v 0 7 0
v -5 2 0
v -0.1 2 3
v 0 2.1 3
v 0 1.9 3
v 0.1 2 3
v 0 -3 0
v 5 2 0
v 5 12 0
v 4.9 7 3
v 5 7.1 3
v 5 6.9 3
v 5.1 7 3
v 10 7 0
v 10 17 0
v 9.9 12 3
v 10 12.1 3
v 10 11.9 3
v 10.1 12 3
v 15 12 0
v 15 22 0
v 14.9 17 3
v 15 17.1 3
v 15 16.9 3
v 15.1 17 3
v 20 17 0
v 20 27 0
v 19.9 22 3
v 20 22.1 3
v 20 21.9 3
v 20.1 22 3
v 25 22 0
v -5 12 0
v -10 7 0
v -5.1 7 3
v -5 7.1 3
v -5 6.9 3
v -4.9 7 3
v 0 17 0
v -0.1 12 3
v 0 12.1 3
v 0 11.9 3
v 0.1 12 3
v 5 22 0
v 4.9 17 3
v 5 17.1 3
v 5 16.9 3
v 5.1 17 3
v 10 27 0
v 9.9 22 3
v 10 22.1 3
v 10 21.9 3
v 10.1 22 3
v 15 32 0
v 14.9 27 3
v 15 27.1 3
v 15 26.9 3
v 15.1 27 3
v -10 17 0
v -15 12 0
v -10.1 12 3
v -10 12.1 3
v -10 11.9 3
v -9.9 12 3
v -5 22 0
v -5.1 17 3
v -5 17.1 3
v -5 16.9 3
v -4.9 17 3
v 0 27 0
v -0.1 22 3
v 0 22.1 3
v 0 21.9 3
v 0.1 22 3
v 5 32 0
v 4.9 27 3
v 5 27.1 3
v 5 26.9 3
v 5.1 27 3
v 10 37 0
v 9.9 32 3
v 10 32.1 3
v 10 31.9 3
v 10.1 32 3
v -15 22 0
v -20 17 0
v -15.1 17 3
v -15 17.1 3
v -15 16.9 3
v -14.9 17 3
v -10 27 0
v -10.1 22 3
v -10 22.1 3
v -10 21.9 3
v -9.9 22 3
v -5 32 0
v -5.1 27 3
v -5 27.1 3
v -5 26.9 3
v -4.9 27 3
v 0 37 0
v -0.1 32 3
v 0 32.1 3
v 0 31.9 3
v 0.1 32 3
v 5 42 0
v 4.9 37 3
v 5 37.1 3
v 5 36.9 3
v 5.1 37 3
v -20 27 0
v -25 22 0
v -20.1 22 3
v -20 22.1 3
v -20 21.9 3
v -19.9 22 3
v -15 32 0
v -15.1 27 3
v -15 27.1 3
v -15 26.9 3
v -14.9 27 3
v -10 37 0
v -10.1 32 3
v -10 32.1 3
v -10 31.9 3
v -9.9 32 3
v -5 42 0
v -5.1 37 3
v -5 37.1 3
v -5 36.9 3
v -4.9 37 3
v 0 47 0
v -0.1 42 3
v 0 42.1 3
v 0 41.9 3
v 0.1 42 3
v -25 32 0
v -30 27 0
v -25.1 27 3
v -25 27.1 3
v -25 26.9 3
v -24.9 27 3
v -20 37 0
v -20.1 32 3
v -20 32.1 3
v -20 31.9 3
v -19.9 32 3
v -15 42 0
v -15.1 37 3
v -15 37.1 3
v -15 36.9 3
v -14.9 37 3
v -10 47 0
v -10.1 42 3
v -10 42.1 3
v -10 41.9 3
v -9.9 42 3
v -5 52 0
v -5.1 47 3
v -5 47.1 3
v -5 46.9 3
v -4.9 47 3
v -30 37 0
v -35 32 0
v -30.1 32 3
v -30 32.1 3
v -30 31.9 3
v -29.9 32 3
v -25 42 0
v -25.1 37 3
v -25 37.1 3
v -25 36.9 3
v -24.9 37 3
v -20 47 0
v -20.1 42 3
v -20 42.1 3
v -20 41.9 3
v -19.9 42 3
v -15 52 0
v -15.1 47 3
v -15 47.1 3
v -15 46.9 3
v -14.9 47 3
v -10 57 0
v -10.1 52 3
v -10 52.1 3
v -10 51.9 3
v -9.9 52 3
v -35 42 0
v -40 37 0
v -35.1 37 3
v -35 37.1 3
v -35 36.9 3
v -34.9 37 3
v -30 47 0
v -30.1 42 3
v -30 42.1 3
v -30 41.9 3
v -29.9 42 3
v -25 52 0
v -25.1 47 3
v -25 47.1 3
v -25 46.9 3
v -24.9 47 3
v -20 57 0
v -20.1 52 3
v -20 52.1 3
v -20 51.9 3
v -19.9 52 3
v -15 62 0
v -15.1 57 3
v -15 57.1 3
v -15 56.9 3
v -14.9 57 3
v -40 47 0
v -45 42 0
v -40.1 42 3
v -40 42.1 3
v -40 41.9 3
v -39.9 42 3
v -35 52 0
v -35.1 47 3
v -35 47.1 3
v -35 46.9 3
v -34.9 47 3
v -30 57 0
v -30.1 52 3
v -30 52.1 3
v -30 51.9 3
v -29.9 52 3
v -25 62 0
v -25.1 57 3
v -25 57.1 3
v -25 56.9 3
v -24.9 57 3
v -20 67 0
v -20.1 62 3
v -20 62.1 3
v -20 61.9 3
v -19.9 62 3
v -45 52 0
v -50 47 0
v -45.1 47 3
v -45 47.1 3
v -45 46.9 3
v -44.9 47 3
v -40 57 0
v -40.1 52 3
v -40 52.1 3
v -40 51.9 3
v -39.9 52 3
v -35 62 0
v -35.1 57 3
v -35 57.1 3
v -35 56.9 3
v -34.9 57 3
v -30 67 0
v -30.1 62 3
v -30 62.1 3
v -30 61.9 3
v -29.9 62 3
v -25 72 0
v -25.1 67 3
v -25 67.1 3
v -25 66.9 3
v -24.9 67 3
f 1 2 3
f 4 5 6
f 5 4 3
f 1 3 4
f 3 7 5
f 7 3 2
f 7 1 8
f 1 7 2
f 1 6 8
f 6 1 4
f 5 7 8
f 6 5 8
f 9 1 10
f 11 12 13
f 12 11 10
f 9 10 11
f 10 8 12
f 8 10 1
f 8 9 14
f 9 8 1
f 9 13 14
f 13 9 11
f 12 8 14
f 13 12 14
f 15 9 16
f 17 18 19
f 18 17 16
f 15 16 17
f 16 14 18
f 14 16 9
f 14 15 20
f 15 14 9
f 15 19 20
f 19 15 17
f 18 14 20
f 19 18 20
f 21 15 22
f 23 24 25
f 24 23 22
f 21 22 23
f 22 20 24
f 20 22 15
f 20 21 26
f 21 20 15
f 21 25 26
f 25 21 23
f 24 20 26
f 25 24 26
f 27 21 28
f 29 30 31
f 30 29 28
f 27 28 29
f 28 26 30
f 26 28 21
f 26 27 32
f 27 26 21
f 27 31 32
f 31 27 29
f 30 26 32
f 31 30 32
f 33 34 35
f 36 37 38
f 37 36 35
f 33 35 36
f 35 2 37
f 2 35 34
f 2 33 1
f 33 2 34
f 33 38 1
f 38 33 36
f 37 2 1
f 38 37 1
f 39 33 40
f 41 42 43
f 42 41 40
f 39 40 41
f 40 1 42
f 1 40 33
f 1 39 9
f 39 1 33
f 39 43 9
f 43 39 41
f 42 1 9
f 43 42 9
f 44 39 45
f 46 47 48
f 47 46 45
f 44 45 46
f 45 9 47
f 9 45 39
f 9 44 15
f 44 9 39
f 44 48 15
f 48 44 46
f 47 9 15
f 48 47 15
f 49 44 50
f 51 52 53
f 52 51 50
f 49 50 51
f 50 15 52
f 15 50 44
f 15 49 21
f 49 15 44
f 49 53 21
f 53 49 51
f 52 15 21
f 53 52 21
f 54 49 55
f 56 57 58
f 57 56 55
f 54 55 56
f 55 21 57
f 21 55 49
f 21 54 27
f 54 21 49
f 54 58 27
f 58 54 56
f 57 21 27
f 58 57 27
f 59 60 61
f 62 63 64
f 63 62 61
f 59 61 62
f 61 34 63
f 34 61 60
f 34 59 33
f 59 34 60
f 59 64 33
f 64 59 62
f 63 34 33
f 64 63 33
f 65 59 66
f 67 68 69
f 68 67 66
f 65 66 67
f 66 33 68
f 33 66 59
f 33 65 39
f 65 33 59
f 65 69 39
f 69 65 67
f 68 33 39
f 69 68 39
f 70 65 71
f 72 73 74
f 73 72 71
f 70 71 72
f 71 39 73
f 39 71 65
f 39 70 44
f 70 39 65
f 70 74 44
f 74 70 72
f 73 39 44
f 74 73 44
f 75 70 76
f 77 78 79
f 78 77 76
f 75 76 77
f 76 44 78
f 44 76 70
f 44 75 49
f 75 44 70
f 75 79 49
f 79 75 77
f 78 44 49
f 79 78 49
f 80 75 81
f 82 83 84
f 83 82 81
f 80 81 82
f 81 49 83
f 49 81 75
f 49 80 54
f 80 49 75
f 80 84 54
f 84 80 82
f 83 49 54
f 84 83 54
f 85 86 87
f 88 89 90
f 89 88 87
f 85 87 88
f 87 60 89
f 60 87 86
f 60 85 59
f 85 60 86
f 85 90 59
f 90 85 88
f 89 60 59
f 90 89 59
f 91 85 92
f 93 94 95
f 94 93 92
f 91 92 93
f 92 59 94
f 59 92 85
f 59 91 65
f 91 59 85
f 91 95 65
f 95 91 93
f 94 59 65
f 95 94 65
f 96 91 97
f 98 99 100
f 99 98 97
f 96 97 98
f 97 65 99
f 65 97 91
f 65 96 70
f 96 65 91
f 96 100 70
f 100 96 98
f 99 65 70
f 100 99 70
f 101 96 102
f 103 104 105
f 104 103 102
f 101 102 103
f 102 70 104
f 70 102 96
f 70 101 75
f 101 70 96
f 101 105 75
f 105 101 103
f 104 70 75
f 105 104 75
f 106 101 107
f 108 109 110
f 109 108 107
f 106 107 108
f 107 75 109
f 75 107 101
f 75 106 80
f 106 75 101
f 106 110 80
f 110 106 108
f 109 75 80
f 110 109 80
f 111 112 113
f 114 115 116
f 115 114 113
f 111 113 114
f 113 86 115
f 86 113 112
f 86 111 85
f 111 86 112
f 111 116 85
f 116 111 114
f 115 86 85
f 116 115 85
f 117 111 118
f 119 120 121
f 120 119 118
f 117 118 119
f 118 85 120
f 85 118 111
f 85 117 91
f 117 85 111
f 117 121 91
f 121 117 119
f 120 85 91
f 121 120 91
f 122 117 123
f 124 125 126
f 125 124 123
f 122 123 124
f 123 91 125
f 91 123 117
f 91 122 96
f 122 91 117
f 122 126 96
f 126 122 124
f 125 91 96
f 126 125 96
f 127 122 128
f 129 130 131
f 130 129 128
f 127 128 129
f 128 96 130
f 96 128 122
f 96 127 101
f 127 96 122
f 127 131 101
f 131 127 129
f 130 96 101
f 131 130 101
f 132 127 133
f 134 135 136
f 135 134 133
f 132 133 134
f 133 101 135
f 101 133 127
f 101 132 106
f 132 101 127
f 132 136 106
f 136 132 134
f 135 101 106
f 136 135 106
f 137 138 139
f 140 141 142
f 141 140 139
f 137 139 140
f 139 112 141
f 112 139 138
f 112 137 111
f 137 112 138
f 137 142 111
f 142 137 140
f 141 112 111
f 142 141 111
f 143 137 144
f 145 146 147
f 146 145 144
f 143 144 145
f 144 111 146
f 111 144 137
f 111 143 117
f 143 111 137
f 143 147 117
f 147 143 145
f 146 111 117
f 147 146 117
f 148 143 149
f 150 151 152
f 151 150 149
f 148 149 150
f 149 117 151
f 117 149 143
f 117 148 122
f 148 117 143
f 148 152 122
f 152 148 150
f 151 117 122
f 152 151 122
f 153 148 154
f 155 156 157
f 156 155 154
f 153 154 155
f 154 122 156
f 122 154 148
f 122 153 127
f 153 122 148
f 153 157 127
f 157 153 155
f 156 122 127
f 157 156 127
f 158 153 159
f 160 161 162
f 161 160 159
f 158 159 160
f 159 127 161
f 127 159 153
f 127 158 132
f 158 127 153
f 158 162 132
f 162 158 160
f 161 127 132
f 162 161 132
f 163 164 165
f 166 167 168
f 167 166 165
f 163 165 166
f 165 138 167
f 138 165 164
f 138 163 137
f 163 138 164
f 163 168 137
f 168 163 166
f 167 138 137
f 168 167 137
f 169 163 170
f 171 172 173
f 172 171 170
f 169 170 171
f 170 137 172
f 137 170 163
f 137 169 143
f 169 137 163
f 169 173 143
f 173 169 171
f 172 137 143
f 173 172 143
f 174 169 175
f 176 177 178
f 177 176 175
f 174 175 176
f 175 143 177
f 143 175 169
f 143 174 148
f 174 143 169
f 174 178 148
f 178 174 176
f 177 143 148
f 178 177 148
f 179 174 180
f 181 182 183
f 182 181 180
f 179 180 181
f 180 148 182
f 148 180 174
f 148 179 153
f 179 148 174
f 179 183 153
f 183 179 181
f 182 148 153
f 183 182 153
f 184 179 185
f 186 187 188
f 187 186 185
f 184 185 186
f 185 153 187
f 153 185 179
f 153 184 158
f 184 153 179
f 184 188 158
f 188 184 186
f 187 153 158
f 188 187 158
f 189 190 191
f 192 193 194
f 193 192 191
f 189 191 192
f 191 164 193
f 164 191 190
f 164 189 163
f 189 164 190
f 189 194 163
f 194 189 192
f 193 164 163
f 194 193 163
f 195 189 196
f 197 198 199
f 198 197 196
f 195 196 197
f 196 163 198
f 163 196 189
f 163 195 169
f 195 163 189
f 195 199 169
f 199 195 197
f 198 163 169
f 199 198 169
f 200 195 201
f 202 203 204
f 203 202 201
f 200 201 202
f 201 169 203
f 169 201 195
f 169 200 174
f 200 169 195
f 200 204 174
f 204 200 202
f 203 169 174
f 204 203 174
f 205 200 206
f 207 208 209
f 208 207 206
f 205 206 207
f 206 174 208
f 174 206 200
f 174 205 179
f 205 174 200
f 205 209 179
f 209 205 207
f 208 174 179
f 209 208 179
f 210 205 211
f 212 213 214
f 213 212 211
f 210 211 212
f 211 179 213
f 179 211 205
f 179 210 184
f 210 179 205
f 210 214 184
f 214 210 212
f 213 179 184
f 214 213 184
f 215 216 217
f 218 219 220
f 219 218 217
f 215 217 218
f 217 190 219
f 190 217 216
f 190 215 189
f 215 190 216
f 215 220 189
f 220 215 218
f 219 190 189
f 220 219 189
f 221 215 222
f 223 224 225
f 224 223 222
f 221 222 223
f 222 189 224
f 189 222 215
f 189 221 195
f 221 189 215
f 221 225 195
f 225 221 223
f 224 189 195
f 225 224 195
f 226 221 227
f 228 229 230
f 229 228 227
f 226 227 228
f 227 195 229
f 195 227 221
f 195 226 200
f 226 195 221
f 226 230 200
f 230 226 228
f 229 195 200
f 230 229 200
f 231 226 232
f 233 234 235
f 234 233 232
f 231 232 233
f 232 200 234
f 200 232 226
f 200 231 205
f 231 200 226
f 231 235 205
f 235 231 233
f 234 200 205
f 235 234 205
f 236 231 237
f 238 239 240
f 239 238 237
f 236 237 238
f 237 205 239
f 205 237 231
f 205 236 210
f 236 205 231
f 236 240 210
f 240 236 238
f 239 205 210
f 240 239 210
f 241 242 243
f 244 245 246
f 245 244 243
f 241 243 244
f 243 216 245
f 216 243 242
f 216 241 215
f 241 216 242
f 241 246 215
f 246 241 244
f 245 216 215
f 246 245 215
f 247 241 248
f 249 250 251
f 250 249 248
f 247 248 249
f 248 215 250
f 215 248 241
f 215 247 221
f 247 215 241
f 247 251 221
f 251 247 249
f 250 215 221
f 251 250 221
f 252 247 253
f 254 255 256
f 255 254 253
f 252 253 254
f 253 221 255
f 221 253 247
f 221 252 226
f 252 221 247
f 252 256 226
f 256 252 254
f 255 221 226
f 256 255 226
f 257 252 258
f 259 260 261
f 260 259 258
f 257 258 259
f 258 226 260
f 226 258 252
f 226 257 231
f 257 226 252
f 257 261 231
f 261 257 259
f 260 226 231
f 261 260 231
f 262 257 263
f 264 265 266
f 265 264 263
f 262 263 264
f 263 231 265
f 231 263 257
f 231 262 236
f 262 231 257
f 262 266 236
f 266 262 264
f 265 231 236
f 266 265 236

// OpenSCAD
for(j=[1:5:50]){translate([-j,j,0]) //out loop "Lenght"
for(i=[1:5:25]){	translate([i,i,0]) //inner loop "Wide"
cylinder(3,5,0.1,center=false,$fn=4);}}
